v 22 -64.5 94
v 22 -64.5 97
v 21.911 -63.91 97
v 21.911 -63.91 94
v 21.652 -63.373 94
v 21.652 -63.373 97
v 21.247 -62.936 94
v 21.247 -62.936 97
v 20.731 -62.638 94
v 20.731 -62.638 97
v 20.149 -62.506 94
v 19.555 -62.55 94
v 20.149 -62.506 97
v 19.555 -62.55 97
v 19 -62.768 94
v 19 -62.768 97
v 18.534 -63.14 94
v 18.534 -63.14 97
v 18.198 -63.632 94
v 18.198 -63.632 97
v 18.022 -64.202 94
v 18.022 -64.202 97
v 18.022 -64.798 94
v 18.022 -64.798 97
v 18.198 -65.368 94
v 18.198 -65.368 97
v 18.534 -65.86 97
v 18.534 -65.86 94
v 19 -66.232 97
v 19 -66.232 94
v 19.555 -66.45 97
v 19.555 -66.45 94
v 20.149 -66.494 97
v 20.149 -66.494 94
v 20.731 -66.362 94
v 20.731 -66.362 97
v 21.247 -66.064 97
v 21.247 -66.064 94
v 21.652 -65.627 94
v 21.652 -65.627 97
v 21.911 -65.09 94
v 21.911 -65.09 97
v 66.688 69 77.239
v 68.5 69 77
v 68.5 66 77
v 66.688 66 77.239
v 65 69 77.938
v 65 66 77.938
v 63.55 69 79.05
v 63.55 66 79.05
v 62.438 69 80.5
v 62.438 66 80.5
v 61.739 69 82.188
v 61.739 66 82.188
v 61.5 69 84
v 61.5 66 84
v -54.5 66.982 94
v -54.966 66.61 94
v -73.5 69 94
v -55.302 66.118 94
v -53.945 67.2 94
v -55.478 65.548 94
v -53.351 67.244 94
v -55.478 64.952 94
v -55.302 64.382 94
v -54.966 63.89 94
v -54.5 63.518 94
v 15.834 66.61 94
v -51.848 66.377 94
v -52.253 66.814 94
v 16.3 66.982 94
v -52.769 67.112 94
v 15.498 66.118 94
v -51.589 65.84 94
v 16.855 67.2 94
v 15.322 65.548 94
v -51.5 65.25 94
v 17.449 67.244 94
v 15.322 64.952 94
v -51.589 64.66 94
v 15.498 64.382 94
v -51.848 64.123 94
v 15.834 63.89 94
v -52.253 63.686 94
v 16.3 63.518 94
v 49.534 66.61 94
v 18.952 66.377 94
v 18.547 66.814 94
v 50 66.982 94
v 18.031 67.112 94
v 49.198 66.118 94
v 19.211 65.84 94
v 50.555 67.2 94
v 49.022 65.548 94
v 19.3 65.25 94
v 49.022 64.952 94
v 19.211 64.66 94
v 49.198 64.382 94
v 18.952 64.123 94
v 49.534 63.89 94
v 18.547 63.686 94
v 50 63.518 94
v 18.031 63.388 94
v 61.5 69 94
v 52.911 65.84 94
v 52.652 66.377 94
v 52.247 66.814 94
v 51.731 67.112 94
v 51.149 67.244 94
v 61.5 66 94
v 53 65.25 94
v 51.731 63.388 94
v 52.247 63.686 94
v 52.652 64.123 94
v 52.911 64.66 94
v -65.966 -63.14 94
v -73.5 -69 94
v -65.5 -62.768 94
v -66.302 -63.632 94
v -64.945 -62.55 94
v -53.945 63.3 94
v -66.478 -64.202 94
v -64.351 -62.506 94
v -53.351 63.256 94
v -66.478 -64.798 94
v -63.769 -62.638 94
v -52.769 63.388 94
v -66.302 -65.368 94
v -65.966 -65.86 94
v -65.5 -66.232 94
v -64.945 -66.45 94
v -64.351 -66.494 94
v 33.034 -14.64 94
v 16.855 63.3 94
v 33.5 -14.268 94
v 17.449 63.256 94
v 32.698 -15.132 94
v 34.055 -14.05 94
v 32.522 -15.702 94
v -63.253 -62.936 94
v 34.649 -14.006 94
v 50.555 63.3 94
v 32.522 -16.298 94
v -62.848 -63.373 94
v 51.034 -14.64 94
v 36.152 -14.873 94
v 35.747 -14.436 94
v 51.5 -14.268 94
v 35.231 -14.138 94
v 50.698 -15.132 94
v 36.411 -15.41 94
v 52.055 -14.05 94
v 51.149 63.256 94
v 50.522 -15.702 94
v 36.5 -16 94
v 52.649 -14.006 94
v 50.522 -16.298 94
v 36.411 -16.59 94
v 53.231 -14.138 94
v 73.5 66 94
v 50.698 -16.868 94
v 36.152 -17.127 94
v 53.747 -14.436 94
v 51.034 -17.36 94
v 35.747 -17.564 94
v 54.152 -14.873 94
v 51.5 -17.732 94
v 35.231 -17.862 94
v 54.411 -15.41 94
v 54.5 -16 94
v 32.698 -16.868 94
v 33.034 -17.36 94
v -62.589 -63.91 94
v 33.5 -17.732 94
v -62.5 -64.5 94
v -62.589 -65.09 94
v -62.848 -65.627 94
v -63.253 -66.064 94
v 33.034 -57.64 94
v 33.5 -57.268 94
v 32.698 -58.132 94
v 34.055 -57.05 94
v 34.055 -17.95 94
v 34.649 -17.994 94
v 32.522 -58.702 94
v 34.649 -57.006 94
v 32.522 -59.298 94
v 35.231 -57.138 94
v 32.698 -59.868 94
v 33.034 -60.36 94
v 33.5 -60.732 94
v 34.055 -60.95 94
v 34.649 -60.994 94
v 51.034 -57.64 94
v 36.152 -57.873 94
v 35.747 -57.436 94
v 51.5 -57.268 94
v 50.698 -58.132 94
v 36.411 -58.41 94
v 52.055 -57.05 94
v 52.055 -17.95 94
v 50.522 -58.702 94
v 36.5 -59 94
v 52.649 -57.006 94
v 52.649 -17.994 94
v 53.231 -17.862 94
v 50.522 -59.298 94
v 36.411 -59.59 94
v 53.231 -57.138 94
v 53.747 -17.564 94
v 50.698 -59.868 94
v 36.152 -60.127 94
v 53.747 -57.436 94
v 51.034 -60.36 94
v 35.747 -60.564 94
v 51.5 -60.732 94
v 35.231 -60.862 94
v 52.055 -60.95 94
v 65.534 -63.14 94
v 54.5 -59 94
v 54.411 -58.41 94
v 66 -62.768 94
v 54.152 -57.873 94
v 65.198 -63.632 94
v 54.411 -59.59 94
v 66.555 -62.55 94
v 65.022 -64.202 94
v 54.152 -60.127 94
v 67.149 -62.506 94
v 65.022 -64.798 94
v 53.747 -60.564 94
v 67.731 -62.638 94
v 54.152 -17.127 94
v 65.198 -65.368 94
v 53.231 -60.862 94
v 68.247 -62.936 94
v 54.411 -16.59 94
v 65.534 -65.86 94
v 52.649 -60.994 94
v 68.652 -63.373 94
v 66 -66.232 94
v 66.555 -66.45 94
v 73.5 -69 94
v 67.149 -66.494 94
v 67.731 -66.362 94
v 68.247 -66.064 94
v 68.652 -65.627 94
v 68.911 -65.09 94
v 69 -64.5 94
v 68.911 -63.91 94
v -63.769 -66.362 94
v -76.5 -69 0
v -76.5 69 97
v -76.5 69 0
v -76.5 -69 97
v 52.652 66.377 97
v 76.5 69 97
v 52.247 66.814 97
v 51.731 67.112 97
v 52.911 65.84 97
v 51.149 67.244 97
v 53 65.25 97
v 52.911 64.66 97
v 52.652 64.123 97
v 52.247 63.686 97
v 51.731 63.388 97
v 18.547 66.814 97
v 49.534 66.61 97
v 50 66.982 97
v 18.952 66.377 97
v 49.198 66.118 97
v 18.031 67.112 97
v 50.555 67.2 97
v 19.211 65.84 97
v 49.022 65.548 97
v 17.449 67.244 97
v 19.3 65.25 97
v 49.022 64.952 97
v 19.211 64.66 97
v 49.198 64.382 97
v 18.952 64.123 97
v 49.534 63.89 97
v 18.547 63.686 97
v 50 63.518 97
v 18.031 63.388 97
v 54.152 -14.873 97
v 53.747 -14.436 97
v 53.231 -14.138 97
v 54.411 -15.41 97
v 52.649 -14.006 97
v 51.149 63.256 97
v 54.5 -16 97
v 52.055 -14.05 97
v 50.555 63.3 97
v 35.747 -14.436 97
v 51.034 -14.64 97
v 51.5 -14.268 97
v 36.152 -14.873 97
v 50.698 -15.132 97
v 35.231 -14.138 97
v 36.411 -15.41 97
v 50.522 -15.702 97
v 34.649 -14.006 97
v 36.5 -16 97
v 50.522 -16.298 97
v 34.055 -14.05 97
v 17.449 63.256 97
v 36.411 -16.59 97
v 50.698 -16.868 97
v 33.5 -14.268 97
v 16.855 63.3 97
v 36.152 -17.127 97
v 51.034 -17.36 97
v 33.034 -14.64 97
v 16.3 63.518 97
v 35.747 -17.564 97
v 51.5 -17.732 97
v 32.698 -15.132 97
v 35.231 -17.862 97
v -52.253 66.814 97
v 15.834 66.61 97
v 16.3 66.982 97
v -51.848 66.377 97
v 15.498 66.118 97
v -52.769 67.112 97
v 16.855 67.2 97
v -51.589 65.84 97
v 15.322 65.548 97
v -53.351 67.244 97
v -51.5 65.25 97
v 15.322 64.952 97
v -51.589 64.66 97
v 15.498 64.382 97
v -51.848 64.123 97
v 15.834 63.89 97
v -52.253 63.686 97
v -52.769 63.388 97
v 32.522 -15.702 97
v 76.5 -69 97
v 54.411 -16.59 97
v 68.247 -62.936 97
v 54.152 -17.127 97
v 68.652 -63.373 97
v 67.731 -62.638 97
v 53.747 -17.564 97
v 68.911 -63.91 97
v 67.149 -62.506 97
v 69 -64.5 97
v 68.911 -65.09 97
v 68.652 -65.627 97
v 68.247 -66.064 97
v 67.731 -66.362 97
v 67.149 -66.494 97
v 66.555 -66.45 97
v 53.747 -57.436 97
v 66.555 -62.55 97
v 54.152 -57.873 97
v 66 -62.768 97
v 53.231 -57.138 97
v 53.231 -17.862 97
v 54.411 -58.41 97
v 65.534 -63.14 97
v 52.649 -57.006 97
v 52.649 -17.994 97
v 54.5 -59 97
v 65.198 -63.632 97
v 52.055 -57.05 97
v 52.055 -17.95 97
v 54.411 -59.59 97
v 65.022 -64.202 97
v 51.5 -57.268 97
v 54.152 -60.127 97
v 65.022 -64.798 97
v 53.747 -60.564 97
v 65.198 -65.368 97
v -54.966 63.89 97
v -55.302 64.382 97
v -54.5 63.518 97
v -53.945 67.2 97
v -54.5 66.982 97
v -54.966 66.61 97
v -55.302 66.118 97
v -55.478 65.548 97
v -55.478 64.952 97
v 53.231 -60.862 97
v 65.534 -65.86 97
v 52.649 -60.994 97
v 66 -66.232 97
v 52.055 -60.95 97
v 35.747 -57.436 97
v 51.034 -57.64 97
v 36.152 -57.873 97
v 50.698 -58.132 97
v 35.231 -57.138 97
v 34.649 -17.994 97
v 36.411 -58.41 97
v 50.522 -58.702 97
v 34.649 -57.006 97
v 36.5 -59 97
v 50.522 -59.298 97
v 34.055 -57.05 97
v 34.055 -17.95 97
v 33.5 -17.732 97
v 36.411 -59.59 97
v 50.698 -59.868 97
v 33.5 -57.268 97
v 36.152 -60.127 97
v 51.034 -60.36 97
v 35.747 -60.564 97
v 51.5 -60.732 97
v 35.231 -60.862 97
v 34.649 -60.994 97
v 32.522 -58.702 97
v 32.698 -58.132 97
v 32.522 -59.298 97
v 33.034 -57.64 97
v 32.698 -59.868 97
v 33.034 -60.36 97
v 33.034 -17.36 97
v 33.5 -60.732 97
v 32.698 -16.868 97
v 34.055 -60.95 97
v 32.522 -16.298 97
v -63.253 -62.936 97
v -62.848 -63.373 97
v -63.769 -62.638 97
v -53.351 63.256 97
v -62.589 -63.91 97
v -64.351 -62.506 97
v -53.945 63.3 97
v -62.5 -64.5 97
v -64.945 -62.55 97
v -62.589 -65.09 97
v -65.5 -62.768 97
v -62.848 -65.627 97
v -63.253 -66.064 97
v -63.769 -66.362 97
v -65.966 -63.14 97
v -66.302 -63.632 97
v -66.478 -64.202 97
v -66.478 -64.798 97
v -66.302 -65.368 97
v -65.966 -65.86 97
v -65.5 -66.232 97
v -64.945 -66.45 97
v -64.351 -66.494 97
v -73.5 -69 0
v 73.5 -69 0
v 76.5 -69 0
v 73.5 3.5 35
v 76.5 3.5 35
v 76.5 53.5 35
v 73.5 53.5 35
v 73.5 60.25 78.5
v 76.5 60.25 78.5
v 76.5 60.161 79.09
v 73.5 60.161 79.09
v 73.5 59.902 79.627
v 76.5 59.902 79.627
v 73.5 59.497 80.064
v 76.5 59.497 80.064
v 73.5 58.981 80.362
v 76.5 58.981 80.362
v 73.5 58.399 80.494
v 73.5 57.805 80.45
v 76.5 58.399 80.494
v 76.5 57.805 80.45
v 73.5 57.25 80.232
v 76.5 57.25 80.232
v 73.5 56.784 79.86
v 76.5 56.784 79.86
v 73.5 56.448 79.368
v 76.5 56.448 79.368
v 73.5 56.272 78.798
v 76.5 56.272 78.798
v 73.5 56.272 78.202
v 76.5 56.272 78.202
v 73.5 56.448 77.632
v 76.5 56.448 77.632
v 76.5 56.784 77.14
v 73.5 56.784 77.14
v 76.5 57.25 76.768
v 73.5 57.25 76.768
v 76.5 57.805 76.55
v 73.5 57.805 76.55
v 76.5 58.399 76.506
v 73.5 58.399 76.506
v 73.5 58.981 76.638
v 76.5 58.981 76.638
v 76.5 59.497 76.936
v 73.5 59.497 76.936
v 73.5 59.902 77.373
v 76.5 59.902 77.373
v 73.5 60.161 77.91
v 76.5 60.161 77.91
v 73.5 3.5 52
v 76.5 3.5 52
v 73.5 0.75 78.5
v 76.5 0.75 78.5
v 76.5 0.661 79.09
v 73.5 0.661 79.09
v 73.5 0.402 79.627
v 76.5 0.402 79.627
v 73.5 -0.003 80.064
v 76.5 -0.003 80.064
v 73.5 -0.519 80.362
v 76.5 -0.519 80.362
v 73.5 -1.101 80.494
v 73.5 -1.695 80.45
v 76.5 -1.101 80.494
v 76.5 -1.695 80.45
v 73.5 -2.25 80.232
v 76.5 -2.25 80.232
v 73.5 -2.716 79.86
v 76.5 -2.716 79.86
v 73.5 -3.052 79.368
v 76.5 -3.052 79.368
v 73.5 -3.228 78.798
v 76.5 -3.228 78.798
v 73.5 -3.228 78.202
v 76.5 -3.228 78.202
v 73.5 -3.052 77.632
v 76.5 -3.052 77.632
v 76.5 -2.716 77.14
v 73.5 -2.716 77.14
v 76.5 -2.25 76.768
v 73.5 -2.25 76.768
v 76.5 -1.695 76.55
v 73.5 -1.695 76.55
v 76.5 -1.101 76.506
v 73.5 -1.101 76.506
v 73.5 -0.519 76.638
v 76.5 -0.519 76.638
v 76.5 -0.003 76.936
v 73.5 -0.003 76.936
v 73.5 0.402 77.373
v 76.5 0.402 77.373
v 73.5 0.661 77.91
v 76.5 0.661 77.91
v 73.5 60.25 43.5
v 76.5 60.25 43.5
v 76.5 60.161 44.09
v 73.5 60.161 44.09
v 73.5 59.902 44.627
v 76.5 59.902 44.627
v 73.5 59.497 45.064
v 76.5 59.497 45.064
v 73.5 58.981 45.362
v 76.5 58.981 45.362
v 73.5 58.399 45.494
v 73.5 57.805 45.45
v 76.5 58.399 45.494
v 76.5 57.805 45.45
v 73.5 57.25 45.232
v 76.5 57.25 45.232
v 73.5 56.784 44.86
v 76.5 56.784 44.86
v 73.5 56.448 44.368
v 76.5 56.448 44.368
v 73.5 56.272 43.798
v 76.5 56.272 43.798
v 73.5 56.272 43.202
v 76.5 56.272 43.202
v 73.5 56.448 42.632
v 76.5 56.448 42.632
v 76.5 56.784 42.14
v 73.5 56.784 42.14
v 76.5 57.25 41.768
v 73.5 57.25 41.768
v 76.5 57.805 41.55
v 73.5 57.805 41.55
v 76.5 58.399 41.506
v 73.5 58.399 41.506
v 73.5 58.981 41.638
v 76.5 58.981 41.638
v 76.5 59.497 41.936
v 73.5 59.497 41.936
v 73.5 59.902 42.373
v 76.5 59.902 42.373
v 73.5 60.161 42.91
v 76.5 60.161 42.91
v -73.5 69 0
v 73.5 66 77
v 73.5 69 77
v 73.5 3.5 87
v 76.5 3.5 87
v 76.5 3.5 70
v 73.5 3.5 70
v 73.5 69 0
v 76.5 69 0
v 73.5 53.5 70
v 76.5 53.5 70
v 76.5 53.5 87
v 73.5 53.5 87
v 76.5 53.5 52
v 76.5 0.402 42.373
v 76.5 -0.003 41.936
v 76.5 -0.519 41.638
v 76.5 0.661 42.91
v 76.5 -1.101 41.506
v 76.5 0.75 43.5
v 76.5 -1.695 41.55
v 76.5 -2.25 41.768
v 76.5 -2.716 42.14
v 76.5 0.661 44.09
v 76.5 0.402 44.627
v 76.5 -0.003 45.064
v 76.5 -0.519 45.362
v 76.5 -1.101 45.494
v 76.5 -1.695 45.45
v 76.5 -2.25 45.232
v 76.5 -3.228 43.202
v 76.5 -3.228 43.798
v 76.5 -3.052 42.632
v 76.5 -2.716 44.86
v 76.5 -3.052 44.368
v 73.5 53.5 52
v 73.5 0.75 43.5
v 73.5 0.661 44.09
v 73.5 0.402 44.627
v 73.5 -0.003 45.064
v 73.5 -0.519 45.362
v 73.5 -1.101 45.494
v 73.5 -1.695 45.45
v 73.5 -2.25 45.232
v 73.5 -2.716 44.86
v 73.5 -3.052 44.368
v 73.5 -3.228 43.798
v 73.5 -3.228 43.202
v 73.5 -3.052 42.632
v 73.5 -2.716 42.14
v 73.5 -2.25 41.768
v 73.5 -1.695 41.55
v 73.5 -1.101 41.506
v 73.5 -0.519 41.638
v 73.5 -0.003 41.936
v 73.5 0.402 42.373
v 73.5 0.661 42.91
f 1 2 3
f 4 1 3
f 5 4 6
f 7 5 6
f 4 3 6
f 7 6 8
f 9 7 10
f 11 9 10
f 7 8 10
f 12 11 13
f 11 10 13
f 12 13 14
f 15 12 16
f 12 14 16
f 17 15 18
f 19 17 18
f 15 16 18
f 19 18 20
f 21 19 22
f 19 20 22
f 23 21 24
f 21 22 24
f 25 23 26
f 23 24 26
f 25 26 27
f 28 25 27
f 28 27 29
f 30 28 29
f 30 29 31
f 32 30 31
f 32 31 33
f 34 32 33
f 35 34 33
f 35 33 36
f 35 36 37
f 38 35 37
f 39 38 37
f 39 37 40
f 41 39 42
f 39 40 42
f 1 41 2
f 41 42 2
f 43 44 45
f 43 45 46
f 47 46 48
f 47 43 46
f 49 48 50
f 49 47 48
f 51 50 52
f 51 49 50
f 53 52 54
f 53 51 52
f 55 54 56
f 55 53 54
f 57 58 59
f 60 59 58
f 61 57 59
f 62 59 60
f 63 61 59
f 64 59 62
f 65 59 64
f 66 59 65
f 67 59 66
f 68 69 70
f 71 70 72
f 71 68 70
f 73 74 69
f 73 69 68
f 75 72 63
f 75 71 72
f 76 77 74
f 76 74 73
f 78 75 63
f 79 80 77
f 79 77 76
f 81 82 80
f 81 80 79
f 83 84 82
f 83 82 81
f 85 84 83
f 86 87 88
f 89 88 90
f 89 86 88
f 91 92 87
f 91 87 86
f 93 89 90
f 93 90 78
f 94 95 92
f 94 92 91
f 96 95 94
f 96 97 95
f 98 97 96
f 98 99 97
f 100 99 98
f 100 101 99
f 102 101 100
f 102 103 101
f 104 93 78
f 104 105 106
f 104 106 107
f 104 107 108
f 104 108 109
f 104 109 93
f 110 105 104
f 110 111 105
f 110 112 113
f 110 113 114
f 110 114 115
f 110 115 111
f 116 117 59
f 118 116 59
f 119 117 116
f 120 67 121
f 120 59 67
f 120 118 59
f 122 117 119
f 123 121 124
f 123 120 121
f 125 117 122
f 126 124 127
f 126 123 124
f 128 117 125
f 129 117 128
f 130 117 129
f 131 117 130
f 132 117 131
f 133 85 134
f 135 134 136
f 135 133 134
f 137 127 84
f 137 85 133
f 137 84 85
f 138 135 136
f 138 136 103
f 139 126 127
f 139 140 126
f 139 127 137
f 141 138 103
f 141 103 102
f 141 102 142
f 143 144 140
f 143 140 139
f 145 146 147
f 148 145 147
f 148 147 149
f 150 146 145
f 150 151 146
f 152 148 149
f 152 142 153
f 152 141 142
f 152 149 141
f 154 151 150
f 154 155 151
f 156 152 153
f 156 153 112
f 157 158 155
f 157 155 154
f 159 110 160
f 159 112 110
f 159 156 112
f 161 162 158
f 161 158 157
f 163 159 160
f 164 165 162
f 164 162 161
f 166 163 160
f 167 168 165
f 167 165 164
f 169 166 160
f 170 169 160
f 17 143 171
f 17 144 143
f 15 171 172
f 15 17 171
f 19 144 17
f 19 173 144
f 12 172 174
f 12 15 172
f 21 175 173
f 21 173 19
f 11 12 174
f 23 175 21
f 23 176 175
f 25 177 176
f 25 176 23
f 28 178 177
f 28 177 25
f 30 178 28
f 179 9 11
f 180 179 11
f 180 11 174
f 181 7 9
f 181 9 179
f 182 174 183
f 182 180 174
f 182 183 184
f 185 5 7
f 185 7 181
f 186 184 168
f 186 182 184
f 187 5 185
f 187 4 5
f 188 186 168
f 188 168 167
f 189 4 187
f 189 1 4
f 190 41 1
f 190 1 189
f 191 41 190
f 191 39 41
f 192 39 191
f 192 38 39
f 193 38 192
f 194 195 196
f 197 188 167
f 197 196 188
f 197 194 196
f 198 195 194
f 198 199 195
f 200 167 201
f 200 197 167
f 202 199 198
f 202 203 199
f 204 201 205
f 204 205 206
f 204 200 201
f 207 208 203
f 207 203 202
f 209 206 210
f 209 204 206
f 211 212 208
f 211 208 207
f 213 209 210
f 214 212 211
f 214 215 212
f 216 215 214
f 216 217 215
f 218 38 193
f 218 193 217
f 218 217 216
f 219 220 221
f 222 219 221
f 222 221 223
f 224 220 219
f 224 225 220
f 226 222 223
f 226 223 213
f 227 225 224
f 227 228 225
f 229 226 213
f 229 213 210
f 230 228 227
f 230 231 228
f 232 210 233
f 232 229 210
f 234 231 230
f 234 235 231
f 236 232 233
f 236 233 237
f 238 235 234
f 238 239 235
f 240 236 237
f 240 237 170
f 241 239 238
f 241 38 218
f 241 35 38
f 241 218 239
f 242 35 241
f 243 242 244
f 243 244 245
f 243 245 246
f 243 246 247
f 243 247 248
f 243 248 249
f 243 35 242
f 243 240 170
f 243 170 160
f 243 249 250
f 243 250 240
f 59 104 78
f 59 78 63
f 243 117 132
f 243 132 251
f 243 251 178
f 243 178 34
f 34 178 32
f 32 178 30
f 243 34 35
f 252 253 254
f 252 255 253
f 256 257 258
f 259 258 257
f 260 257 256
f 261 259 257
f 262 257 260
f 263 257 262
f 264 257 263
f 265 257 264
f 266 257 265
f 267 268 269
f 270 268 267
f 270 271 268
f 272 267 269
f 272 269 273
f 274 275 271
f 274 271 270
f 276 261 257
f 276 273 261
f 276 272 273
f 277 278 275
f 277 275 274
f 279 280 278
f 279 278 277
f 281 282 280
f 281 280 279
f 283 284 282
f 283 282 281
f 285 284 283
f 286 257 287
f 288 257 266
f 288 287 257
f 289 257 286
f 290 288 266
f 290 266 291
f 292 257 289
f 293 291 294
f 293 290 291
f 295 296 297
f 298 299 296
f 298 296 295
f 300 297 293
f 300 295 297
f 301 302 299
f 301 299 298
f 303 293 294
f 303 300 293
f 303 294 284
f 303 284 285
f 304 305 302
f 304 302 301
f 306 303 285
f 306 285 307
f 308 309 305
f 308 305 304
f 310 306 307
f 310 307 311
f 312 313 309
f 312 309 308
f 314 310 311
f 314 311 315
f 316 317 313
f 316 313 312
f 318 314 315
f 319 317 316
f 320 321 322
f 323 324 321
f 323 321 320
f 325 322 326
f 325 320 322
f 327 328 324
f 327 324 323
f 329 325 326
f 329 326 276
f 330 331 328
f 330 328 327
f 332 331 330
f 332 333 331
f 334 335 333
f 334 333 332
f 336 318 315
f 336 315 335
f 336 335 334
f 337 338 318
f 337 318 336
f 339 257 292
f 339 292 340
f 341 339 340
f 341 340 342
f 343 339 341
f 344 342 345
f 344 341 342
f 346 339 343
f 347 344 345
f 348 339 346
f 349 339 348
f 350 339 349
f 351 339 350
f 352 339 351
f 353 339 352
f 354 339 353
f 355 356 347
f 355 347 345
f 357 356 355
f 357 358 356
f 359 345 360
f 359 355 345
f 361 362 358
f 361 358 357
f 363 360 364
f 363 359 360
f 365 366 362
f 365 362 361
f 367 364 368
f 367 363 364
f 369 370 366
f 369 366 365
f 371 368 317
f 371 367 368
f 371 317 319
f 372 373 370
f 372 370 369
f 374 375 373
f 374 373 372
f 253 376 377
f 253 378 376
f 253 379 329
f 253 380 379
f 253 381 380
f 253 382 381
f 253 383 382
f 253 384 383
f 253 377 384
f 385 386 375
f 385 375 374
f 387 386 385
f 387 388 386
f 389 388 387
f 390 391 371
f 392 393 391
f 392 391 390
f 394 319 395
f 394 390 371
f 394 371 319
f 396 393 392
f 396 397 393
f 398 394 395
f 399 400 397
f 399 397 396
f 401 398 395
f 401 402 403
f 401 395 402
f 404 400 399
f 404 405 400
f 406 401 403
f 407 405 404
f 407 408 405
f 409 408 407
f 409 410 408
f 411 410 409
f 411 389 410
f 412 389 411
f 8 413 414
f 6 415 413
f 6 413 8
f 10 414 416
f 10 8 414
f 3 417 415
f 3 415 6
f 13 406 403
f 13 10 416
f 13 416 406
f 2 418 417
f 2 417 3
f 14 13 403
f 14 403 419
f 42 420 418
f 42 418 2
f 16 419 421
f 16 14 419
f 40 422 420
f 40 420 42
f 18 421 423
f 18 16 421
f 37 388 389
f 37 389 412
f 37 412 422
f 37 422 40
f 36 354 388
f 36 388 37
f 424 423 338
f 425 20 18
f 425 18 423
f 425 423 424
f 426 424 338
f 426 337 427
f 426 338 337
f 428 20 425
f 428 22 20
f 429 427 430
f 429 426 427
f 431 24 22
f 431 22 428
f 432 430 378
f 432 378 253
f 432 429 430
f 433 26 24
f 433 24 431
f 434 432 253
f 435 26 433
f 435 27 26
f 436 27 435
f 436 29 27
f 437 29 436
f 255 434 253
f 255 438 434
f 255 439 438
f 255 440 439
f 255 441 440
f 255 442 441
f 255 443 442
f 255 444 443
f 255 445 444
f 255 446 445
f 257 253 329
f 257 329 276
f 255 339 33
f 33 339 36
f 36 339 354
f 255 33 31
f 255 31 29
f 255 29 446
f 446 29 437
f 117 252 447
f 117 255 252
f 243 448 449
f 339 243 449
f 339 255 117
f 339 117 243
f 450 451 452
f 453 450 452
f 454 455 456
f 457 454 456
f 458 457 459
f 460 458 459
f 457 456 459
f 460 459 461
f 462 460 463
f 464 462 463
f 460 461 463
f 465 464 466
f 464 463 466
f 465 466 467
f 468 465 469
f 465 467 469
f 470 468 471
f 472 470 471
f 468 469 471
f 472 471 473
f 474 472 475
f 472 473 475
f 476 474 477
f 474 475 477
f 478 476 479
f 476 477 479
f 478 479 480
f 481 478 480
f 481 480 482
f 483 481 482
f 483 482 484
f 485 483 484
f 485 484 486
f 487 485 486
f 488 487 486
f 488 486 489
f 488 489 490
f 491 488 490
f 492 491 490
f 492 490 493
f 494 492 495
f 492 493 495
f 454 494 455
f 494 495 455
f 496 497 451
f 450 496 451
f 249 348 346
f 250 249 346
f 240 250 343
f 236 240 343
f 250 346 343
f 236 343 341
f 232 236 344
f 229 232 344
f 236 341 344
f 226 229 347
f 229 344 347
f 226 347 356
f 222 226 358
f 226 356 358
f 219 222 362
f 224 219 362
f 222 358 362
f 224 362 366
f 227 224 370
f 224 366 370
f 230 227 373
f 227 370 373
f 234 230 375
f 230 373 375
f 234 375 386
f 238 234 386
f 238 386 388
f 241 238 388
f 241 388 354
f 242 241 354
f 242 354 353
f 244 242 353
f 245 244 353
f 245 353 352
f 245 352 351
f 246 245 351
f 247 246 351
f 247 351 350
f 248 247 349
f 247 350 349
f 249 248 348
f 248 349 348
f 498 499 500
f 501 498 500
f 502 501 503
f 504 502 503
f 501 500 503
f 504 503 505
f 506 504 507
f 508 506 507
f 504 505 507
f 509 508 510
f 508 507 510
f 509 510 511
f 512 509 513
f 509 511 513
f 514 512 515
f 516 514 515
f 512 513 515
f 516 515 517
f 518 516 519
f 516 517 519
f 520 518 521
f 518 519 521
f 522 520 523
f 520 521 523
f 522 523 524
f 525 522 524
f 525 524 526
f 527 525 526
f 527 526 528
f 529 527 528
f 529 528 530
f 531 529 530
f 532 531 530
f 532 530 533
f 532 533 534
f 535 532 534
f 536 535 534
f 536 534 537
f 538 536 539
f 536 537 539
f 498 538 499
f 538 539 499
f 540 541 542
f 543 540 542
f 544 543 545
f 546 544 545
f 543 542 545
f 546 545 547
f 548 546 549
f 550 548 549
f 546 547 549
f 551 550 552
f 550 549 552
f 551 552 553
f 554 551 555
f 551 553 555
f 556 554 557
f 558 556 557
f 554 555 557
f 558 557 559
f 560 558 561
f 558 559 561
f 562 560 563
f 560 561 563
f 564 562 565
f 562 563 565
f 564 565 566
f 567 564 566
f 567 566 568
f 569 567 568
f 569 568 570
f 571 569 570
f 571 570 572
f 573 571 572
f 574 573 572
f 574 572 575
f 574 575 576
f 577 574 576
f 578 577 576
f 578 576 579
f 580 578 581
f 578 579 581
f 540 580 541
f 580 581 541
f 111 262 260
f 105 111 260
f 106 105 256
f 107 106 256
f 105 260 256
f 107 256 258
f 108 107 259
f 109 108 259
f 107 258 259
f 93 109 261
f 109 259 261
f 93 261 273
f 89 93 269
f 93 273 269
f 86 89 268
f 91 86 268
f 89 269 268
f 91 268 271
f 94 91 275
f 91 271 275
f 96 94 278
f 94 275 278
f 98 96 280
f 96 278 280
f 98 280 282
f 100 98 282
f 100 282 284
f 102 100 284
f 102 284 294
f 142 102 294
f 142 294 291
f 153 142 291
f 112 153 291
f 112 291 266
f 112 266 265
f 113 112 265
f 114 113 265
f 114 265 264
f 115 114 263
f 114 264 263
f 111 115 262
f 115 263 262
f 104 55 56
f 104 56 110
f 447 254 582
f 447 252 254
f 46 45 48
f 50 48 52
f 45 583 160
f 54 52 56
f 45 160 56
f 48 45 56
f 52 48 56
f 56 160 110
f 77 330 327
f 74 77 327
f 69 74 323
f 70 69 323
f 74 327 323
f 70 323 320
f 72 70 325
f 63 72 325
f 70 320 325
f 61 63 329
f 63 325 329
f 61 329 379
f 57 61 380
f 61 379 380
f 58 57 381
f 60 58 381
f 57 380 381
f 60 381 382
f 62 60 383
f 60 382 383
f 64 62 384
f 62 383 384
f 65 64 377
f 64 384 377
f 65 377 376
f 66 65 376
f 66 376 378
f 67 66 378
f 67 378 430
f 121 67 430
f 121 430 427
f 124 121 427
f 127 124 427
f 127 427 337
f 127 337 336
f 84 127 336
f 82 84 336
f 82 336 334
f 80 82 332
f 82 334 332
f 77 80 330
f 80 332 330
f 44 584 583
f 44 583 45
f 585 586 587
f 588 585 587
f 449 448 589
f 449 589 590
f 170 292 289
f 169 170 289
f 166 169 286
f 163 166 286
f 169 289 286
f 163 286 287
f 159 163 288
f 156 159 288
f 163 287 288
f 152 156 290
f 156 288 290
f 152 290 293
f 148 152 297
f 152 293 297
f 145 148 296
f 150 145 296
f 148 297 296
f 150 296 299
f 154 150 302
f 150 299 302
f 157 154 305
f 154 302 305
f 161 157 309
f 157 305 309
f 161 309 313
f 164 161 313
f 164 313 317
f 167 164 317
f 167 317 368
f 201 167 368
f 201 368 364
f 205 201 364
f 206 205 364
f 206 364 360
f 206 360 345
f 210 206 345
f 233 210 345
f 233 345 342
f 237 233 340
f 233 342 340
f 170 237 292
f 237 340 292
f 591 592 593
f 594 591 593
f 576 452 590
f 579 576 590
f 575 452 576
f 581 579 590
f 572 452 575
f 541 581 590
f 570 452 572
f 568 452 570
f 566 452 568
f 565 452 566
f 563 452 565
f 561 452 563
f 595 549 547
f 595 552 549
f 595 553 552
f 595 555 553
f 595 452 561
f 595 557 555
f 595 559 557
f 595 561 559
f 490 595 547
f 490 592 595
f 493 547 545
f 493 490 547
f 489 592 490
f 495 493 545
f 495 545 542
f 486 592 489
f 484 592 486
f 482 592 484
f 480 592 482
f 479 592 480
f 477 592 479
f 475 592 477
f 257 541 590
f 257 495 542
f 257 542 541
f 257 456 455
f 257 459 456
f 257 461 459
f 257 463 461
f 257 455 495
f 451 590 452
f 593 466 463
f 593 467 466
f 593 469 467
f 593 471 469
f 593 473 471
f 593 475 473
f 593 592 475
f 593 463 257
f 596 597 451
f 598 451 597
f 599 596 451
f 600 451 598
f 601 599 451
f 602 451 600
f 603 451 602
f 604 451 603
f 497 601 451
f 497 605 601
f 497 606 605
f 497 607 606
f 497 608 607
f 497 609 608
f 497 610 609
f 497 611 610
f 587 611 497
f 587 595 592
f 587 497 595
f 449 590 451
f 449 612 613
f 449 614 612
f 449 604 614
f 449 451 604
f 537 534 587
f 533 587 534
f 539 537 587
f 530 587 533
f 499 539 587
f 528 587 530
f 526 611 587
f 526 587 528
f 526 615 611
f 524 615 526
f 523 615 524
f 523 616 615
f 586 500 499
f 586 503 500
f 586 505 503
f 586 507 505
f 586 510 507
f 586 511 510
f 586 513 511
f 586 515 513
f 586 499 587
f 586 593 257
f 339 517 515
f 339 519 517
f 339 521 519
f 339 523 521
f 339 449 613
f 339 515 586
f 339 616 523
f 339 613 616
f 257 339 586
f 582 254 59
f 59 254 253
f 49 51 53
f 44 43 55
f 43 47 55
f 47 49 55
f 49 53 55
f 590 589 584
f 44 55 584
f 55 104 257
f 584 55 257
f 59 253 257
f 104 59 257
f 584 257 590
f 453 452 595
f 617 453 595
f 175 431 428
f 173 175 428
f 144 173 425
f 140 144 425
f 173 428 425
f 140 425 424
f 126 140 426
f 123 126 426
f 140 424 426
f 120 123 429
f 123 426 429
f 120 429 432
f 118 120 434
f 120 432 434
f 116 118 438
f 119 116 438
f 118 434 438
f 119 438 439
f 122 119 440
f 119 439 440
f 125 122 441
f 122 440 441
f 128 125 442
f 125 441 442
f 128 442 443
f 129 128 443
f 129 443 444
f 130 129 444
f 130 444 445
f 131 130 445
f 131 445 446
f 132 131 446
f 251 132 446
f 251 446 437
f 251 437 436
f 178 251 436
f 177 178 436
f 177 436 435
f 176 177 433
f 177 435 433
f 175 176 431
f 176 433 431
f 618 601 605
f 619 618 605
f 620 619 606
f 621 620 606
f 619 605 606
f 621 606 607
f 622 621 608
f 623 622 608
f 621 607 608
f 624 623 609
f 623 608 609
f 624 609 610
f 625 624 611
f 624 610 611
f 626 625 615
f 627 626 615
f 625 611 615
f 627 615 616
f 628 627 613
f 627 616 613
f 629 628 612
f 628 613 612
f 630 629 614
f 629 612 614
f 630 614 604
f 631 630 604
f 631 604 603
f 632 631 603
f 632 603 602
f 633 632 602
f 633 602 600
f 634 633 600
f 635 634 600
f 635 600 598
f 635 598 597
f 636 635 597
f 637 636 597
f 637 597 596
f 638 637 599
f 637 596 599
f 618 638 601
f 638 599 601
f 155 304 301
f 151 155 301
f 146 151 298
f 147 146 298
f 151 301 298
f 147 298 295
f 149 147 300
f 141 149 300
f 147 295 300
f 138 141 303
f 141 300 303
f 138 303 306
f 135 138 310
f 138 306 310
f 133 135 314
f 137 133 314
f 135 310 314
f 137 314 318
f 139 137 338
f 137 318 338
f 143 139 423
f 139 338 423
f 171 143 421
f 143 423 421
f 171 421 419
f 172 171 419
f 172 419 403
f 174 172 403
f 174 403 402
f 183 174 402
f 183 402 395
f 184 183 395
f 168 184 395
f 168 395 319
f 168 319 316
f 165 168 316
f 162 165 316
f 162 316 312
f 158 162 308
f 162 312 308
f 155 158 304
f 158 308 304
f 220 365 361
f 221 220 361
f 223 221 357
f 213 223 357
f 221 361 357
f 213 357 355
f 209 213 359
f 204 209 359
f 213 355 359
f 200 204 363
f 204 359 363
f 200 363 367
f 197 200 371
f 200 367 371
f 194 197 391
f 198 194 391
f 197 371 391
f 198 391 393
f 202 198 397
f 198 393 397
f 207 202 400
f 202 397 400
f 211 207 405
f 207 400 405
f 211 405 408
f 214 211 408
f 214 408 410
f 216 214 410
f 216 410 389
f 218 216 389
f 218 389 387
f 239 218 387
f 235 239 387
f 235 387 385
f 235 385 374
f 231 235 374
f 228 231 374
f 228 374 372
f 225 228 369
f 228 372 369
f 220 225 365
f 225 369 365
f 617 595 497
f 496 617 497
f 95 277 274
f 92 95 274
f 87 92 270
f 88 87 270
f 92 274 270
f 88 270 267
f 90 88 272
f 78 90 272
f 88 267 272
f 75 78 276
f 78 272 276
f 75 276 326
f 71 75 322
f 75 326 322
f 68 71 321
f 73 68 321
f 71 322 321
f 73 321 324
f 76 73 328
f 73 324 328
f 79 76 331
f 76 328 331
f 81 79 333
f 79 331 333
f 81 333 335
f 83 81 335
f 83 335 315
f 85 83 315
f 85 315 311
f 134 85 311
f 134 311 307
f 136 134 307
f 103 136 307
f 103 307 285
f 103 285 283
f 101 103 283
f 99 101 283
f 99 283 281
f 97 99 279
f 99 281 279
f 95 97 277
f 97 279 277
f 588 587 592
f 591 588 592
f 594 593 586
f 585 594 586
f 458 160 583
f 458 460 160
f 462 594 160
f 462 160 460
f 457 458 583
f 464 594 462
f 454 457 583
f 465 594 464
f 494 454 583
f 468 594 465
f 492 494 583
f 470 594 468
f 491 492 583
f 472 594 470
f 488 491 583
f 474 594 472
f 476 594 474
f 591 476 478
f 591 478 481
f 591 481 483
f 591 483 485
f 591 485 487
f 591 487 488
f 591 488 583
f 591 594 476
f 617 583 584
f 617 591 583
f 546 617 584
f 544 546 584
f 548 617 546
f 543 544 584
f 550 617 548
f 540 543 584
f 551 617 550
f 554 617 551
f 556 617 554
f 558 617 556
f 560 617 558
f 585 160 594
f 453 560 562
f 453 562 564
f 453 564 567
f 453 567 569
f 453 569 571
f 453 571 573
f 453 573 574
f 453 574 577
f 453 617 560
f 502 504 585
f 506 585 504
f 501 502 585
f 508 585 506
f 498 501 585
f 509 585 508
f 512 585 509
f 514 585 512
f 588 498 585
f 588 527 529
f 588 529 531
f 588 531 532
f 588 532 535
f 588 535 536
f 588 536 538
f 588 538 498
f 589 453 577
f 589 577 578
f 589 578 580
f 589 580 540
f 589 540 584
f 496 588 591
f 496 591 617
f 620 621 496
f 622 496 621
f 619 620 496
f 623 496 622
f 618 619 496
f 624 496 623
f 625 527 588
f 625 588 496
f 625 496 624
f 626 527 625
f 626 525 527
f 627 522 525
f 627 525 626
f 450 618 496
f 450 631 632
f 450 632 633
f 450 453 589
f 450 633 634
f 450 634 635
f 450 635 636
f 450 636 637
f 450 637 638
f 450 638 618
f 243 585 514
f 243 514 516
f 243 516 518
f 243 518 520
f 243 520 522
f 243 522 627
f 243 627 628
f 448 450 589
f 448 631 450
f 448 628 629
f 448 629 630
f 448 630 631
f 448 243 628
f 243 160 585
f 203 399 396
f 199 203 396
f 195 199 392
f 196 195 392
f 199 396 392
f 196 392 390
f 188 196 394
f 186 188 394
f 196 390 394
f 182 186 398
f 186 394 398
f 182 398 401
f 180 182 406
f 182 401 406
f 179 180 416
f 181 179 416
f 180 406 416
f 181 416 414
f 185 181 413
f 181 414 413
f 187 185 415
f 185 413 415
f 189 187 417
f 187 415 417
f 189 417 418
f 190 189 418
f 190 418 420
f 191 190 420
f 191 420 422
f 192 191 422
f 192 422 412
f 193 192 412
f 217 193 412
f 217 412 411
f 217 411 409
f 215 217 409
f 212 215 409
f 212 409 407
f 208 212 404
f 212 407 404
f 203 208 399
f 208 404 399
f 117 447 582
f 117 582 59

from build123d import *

# Parameters (mm, degrees)
F1_DEPTH = 69
F2_R     = 2
F3_DEPTH = 3
F4_R     = 2
F5_DEPTH = 3
F7_DEPTH = 3


with BuildPart() as f1:
    # F0 (on Front) → F1 (new body, symmetric)
    with BuildSketch(Plane.XZ):
        Polygon((-76.5, 0), (-73.5, 0), (-73.5, 94), (0, 94), (73.5, 94), (73.5, 0), (76.5, 0), (76.5, 97), (0, 97), (-76.5, 97), align=None)
    extrude(amount=F1_DEPTH, both=True)

    # F2 (on face) → F3 (cut, through all)
    with BuildSketch(Plane.YZ.offset(76.5)):
        Polygon((53.5, 87), (28.5, 87), (3.5, 87), (3.5, 70), (28.5, 70), (53.5, 70), align=None)
        with Locations((-1.25, 78.5)):
            Circle(F2_R)
        with Locations((58.25, 78.5)):
            Circle(F2_R)
        with Locations((-1.25, 43.5)):
            Circle(F2_R)
        Polygon((28.5, 52), (3.5, 52), (3.5, 35), (28.5, 35), (53.5, 35), (53.5, 52), align=None)
        with Locations((58.25, 43.5)):
            Circle(F2_R)
    extrude(amount=-F3_DEPTH, mode=Mode.SUBTRACT)

    # F4 (on face) → F5 (cut, through all)
    with BuildSketch(Plane.XY.offset(97)):
        with Locations((-53.5, 65.25)):
            Circle(F4_R)
        with Locations((17.3, 65.25)):
            Circle(F4_R)
        with Locations((51, 65.25)):
            Circle(F4_R)
        with Locations((-64.5, -64.5)):
            Circle(F4_R)
        with Locations((20, -64.5)):
            Circle(F4_R)
        with Locations((67, -64.5)):
            Circle(F4_R)
        with Locations((34.5, -16)):
            Circle(F4_R)
        with Locations((52.5, -16)):
            Circle(F4_R)
        with Locations((52.5, -59)):
            Circle(F4_R)
        with Locations((34.5, -59)):
            Circle(F4_R)
    extrude(amount=-F5_DEPTH, mode=Mode.SUBTRACT)

    # F6 (on face) → F7 (join)
    with BuildSketch(Plane(origin=(0, 69, 0), x_dir=(-1, 0, 0), z_dir=(0, 1, 0))):
        with BuildLine():
            Line((-61.5, 97), (-76.5, 97))
            Line((-76.5, 97), (-76.5, 77))
            Line((-76.5, 77), (-68.5, 77))
            ThreePointArc((-68.5, 77), (-63.5502525317, 79.0502525317), (-61.5, 84))
            Line((-61.5, 84), (-61.5, 97))
        make_face()
    extrude(amount=-F7_DEPTH)


solid = f1.part
